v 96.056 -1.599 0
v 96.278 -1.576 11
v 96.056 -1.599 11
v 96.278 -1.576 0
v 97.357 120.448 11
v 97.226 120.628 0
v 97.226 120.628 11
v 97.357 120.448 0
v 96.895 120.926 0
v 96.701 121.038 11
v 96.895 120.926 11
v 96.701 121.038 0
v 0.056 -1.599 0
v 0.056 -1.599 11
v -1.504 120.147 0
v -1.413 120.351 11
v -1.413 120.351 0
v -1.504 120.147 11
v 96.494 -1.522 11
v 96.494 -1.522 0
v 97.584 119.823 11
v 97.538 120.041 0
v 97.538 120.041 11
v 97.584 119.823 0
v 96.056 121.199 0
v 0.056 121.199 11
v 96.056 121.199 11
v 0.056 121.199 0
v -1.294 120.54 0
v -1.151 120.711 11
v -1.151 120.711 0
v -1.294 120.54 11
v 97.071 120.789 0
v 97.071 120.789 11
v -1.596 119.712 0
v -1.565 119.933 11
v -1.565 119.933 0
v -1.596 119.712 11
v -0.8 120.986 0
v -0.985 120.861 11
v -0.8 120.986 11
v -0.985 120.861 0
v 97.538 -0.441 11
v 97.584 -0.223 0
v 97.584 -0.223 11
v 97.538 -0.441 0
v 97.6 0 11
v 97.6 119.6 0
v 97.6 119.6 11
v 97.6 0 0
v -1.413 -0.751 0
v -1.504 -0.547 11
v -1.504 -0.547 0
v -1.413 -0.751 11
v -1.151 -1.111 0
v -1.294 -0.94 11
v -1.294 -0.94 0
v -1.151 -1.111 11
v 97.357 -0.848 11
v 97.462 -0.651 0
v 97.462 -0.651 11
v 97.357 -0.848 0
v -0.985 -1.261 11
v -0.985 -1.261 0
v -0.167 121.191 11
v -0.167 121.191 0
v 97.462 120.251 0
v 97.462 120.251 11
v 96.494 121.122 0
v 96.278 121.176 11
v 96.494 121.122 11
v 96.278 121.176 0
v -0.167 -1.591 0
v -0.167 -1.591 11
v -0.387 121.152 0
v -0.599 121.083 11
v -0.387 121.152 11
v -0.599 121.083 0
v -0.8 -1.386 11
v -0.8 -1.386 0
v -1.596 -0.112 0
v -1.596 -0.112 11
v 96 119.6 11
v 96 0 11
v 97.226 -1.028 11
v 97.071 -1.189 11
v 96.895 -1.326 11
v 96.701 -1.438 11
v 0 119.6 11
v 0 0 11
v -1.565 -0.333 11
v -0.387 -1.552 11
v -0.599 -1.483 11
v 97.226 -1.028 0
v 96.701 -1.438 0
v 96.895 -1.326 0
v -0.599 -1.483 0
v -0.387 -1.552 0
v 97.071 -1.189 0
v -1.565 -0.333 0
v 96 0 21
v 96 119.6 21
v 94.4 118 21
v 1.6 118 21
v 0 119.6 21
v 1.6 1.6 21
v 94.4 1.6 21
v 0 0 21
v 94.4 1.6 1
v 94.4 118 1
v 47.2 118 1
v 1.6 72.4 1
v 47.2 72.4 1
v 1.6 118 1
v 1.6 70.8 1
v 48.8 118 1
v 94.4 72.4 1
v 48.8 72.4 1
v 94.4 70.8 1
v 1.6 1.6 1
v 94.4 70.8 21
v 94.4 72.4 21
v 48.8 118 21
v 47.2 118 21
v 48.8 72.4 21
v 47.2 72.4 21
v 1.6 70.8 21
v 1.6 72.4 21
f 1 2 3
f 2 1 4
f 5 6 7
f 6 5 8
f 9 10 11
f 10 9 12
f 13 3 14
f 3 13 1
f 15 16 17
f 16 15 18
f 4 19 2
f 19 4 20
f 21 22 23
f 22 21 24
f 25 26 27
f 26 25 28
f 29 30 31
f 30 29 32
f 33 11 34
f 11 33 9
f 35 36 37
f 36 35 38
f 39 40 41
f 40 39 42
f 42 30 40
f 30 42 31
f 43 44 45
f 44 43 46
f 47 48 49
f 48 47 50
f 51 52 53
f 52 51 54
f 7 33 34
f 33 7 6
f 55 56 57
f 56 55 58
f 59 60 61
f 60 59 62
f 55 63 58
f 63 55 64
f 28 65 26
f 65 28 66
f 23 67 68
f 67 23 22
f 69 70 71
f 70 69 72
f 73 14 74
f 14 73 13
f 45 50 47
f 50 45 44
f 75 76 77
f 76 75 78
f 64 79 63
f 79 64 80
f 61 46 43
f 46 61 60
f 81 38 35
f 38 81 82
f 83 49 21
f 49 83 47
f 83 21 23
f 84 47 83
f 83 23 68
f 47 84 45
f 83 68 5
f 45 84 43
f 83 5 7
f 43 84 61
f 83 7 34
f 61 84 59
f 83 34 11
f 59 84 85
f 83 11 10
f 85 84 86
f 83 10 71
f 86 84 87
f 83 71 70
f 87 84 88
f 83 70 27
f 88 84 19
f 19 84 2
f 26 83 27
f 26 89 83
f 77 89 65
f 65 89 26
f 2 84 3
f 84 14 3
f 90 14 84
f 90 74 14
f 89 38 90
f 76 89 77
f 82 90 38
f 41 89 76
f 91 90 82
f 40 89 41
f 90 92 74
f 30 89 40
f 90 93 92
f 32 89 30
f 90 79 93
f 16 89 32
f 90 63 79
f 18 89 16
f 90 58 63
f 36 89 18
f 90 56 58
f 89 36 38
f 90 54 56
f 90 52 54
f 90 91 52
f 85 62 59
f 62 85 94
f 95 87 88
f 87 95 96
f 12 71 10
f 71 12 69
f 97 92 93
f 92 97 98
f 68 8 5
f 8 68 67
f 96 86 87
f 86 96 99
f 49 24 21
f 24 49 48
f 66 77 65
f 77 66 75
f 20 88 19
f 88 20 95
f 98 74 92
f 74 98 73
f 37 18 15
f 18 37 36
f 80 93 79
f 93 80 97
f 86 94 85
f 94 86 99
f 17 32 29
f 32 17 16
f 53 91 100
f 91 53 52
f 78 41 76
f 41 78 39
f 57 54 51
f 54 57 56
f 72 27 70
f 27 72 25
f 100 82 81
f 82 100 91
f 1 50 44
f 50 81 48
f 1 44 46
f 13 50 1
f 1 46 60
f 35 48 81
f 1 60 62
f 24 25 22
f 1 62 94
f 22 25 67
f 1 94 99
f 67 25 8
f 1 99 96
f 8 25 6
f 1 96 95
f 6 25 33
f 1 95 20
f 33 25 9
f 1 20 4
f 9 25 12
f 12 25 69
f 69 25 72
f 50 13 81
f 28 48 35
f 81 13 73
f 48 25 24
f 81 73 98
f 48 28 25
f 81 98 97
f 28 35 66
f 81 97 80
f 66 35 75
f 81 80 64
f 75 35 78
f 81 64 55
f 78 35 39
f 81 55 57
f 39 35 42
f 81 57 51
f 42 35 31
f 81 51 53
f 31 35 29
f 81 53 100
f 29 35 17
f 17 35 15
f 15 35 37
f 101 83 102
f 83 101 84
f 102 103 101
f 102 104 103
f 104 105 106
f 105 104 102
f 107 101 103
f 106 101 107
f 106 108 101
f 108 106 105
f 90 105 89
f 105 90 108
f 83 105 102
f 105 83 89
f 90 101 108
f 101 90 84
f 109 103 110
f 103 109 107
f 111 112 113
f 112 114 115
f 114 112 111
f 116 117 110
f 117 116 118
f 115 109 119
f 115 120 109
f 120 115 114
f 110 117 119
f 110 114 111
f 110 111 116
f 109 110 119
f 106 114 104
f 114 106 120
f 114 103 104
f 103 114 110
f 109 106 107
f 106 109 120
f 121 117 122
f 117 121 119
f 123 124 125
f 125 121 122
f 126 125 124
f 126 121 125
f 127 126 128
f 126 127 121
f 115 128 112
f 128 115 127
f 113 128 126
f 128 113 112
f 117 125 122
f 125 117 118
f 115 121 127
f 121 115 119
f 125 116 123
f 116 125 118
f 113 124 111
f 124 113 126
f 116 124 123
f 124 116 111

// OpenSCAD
// Outpost 20th Anniversary Edition
//
// by W. Craig Trader is dual-licensed under 
// Creative Commons Attribution-ShareAlike 3.0 Unported License and
// GNU Lesser GPL 3.0 or later.

include <MCAD/units.scad>;

// Tile dimensions
TILE_THICKNESS = 2 * mm;
TILE_WIDTH = 20 * mm;
TILE_COUNT = 10;

// Physical dimensions
WALL = 0.8 * mm;  // Slicing filament thickness
GAP  = 0.2 * mm;  // Size differential between box and lid, for snug fit
SPACING = 2 * mm; // Space around tiles to make them easier to insert / extract
LID = 1 * mm;
BOTTOM = 1 * mm;

// Wall dimensions
OUTER = 2 * WALL;
INNER = 2 * WALL;

OVERLAP = 0.1 * mm; // Ensures that there are no vertical artifacts leftover

// Command Line Arguments
PART = 1;           // Which part to output
VERBOSE = 1;        // Set to non-zero to see more data

$fn=45;

function inside( cells ) = cells * (TILE_WIDTH + SPACING) + (cells - 1) * INNER;

module parts_dividers() {
    row_x = inside( 4 );
    col_y = inside( 5 );
    div_z = TILE_COUNT * TILE_THICKNESS;
    
    dy = inside( 3 );
    dx = inside( 2 );
    
    if (VERBOSE) {
        echo (InsideLength=row_x, InsideDepth=col_y, InsideHeight=div_z);
    }

    union() {
        translate( [0,dy,0] ) cube( [row_x, INNER, div_z ] );
        translate( [dx,dy+INNER,0] ) cube( [INNER, inside(2), div_z] );
    }
}

module parts_bottom() {
    row_x = inside( 4 );
    col_y = inside( 5 );
    div_z = TILE_COUNT * TILE_THICKNESS;
    
    box_x = row_x + 2 * INNER;
    box_y = col_y + 2 * INNER;
    box_z = div_z - ceil( div_z / 2 );
    
    lip_x = row_x + 2 * INNER;
    lip_y = col_y + 2 * INNER;
    lip_z = div_z;
    
    echo (BoxLength=box_x, BoxDepth=box_y, BoxHeight=box_z);
    
    union() {
        difference() {
            union() {
                minkowski() {
                    cube( [ box_x, box_y, box_z ] );
                    cylinder( r=OUTER, h=1 );
                }
                translate( [ 0, 0, BOTTOM ] )
                    cube( [ lip_x, lip_y, lip_z ] );
                
            }
            
            // Remove inside of box
            translate( [ INNER, INNER, BOTTOM ] )
                cube( [ row_x, col_y, div_z+1 ] );
        }
        
        translate( [ INNER, INNER, BOTTOM ] )
            parts_dividers();
    }
}

module parts_lid() {
    row_x = inside( 4 );
    col_y = inside( 5 );
    div_z = TILE_COUNT * TILE_THICKNESS;
    
    lid_x = row_x + 2 * INNER;
    lid_y = col_y + 2 * INNER;
    lid_z = ceil( div_z / 2 );
    
    lid_r = 10 * mm;
    
    echo (LidLength=lid_x, LidDepth=lid_y, LidHeight=lid_z);

    difference() {
        // Outside of lid
        minkowski() {
            cube( [ lid_x, lid_y, lid_z ] );
            cylinder( r=OUTER, h=LID );
        }
        
        // Remove inside of lid
        translate( [ 0, 0, LID ] )
            cube( [ lid_x, lid_y, lid_z+1 ] );
        
        // Remove notches to make it easier to remove the lid
        translate( [-2*OUTER,lid_y/2+OUTER/2,lid_r-0+lid_z-2*OUTER] ) 
            rotate( [0,90,0] )
                cylinder( r=lid_r, h=lid_x+4*OUTER );
    }
}

// ----- Choose which part to output ------------------------------------------

if (PART == 1) {
    parts_bottom();
} else if (PART == 2) {
    parts_lid();
}
